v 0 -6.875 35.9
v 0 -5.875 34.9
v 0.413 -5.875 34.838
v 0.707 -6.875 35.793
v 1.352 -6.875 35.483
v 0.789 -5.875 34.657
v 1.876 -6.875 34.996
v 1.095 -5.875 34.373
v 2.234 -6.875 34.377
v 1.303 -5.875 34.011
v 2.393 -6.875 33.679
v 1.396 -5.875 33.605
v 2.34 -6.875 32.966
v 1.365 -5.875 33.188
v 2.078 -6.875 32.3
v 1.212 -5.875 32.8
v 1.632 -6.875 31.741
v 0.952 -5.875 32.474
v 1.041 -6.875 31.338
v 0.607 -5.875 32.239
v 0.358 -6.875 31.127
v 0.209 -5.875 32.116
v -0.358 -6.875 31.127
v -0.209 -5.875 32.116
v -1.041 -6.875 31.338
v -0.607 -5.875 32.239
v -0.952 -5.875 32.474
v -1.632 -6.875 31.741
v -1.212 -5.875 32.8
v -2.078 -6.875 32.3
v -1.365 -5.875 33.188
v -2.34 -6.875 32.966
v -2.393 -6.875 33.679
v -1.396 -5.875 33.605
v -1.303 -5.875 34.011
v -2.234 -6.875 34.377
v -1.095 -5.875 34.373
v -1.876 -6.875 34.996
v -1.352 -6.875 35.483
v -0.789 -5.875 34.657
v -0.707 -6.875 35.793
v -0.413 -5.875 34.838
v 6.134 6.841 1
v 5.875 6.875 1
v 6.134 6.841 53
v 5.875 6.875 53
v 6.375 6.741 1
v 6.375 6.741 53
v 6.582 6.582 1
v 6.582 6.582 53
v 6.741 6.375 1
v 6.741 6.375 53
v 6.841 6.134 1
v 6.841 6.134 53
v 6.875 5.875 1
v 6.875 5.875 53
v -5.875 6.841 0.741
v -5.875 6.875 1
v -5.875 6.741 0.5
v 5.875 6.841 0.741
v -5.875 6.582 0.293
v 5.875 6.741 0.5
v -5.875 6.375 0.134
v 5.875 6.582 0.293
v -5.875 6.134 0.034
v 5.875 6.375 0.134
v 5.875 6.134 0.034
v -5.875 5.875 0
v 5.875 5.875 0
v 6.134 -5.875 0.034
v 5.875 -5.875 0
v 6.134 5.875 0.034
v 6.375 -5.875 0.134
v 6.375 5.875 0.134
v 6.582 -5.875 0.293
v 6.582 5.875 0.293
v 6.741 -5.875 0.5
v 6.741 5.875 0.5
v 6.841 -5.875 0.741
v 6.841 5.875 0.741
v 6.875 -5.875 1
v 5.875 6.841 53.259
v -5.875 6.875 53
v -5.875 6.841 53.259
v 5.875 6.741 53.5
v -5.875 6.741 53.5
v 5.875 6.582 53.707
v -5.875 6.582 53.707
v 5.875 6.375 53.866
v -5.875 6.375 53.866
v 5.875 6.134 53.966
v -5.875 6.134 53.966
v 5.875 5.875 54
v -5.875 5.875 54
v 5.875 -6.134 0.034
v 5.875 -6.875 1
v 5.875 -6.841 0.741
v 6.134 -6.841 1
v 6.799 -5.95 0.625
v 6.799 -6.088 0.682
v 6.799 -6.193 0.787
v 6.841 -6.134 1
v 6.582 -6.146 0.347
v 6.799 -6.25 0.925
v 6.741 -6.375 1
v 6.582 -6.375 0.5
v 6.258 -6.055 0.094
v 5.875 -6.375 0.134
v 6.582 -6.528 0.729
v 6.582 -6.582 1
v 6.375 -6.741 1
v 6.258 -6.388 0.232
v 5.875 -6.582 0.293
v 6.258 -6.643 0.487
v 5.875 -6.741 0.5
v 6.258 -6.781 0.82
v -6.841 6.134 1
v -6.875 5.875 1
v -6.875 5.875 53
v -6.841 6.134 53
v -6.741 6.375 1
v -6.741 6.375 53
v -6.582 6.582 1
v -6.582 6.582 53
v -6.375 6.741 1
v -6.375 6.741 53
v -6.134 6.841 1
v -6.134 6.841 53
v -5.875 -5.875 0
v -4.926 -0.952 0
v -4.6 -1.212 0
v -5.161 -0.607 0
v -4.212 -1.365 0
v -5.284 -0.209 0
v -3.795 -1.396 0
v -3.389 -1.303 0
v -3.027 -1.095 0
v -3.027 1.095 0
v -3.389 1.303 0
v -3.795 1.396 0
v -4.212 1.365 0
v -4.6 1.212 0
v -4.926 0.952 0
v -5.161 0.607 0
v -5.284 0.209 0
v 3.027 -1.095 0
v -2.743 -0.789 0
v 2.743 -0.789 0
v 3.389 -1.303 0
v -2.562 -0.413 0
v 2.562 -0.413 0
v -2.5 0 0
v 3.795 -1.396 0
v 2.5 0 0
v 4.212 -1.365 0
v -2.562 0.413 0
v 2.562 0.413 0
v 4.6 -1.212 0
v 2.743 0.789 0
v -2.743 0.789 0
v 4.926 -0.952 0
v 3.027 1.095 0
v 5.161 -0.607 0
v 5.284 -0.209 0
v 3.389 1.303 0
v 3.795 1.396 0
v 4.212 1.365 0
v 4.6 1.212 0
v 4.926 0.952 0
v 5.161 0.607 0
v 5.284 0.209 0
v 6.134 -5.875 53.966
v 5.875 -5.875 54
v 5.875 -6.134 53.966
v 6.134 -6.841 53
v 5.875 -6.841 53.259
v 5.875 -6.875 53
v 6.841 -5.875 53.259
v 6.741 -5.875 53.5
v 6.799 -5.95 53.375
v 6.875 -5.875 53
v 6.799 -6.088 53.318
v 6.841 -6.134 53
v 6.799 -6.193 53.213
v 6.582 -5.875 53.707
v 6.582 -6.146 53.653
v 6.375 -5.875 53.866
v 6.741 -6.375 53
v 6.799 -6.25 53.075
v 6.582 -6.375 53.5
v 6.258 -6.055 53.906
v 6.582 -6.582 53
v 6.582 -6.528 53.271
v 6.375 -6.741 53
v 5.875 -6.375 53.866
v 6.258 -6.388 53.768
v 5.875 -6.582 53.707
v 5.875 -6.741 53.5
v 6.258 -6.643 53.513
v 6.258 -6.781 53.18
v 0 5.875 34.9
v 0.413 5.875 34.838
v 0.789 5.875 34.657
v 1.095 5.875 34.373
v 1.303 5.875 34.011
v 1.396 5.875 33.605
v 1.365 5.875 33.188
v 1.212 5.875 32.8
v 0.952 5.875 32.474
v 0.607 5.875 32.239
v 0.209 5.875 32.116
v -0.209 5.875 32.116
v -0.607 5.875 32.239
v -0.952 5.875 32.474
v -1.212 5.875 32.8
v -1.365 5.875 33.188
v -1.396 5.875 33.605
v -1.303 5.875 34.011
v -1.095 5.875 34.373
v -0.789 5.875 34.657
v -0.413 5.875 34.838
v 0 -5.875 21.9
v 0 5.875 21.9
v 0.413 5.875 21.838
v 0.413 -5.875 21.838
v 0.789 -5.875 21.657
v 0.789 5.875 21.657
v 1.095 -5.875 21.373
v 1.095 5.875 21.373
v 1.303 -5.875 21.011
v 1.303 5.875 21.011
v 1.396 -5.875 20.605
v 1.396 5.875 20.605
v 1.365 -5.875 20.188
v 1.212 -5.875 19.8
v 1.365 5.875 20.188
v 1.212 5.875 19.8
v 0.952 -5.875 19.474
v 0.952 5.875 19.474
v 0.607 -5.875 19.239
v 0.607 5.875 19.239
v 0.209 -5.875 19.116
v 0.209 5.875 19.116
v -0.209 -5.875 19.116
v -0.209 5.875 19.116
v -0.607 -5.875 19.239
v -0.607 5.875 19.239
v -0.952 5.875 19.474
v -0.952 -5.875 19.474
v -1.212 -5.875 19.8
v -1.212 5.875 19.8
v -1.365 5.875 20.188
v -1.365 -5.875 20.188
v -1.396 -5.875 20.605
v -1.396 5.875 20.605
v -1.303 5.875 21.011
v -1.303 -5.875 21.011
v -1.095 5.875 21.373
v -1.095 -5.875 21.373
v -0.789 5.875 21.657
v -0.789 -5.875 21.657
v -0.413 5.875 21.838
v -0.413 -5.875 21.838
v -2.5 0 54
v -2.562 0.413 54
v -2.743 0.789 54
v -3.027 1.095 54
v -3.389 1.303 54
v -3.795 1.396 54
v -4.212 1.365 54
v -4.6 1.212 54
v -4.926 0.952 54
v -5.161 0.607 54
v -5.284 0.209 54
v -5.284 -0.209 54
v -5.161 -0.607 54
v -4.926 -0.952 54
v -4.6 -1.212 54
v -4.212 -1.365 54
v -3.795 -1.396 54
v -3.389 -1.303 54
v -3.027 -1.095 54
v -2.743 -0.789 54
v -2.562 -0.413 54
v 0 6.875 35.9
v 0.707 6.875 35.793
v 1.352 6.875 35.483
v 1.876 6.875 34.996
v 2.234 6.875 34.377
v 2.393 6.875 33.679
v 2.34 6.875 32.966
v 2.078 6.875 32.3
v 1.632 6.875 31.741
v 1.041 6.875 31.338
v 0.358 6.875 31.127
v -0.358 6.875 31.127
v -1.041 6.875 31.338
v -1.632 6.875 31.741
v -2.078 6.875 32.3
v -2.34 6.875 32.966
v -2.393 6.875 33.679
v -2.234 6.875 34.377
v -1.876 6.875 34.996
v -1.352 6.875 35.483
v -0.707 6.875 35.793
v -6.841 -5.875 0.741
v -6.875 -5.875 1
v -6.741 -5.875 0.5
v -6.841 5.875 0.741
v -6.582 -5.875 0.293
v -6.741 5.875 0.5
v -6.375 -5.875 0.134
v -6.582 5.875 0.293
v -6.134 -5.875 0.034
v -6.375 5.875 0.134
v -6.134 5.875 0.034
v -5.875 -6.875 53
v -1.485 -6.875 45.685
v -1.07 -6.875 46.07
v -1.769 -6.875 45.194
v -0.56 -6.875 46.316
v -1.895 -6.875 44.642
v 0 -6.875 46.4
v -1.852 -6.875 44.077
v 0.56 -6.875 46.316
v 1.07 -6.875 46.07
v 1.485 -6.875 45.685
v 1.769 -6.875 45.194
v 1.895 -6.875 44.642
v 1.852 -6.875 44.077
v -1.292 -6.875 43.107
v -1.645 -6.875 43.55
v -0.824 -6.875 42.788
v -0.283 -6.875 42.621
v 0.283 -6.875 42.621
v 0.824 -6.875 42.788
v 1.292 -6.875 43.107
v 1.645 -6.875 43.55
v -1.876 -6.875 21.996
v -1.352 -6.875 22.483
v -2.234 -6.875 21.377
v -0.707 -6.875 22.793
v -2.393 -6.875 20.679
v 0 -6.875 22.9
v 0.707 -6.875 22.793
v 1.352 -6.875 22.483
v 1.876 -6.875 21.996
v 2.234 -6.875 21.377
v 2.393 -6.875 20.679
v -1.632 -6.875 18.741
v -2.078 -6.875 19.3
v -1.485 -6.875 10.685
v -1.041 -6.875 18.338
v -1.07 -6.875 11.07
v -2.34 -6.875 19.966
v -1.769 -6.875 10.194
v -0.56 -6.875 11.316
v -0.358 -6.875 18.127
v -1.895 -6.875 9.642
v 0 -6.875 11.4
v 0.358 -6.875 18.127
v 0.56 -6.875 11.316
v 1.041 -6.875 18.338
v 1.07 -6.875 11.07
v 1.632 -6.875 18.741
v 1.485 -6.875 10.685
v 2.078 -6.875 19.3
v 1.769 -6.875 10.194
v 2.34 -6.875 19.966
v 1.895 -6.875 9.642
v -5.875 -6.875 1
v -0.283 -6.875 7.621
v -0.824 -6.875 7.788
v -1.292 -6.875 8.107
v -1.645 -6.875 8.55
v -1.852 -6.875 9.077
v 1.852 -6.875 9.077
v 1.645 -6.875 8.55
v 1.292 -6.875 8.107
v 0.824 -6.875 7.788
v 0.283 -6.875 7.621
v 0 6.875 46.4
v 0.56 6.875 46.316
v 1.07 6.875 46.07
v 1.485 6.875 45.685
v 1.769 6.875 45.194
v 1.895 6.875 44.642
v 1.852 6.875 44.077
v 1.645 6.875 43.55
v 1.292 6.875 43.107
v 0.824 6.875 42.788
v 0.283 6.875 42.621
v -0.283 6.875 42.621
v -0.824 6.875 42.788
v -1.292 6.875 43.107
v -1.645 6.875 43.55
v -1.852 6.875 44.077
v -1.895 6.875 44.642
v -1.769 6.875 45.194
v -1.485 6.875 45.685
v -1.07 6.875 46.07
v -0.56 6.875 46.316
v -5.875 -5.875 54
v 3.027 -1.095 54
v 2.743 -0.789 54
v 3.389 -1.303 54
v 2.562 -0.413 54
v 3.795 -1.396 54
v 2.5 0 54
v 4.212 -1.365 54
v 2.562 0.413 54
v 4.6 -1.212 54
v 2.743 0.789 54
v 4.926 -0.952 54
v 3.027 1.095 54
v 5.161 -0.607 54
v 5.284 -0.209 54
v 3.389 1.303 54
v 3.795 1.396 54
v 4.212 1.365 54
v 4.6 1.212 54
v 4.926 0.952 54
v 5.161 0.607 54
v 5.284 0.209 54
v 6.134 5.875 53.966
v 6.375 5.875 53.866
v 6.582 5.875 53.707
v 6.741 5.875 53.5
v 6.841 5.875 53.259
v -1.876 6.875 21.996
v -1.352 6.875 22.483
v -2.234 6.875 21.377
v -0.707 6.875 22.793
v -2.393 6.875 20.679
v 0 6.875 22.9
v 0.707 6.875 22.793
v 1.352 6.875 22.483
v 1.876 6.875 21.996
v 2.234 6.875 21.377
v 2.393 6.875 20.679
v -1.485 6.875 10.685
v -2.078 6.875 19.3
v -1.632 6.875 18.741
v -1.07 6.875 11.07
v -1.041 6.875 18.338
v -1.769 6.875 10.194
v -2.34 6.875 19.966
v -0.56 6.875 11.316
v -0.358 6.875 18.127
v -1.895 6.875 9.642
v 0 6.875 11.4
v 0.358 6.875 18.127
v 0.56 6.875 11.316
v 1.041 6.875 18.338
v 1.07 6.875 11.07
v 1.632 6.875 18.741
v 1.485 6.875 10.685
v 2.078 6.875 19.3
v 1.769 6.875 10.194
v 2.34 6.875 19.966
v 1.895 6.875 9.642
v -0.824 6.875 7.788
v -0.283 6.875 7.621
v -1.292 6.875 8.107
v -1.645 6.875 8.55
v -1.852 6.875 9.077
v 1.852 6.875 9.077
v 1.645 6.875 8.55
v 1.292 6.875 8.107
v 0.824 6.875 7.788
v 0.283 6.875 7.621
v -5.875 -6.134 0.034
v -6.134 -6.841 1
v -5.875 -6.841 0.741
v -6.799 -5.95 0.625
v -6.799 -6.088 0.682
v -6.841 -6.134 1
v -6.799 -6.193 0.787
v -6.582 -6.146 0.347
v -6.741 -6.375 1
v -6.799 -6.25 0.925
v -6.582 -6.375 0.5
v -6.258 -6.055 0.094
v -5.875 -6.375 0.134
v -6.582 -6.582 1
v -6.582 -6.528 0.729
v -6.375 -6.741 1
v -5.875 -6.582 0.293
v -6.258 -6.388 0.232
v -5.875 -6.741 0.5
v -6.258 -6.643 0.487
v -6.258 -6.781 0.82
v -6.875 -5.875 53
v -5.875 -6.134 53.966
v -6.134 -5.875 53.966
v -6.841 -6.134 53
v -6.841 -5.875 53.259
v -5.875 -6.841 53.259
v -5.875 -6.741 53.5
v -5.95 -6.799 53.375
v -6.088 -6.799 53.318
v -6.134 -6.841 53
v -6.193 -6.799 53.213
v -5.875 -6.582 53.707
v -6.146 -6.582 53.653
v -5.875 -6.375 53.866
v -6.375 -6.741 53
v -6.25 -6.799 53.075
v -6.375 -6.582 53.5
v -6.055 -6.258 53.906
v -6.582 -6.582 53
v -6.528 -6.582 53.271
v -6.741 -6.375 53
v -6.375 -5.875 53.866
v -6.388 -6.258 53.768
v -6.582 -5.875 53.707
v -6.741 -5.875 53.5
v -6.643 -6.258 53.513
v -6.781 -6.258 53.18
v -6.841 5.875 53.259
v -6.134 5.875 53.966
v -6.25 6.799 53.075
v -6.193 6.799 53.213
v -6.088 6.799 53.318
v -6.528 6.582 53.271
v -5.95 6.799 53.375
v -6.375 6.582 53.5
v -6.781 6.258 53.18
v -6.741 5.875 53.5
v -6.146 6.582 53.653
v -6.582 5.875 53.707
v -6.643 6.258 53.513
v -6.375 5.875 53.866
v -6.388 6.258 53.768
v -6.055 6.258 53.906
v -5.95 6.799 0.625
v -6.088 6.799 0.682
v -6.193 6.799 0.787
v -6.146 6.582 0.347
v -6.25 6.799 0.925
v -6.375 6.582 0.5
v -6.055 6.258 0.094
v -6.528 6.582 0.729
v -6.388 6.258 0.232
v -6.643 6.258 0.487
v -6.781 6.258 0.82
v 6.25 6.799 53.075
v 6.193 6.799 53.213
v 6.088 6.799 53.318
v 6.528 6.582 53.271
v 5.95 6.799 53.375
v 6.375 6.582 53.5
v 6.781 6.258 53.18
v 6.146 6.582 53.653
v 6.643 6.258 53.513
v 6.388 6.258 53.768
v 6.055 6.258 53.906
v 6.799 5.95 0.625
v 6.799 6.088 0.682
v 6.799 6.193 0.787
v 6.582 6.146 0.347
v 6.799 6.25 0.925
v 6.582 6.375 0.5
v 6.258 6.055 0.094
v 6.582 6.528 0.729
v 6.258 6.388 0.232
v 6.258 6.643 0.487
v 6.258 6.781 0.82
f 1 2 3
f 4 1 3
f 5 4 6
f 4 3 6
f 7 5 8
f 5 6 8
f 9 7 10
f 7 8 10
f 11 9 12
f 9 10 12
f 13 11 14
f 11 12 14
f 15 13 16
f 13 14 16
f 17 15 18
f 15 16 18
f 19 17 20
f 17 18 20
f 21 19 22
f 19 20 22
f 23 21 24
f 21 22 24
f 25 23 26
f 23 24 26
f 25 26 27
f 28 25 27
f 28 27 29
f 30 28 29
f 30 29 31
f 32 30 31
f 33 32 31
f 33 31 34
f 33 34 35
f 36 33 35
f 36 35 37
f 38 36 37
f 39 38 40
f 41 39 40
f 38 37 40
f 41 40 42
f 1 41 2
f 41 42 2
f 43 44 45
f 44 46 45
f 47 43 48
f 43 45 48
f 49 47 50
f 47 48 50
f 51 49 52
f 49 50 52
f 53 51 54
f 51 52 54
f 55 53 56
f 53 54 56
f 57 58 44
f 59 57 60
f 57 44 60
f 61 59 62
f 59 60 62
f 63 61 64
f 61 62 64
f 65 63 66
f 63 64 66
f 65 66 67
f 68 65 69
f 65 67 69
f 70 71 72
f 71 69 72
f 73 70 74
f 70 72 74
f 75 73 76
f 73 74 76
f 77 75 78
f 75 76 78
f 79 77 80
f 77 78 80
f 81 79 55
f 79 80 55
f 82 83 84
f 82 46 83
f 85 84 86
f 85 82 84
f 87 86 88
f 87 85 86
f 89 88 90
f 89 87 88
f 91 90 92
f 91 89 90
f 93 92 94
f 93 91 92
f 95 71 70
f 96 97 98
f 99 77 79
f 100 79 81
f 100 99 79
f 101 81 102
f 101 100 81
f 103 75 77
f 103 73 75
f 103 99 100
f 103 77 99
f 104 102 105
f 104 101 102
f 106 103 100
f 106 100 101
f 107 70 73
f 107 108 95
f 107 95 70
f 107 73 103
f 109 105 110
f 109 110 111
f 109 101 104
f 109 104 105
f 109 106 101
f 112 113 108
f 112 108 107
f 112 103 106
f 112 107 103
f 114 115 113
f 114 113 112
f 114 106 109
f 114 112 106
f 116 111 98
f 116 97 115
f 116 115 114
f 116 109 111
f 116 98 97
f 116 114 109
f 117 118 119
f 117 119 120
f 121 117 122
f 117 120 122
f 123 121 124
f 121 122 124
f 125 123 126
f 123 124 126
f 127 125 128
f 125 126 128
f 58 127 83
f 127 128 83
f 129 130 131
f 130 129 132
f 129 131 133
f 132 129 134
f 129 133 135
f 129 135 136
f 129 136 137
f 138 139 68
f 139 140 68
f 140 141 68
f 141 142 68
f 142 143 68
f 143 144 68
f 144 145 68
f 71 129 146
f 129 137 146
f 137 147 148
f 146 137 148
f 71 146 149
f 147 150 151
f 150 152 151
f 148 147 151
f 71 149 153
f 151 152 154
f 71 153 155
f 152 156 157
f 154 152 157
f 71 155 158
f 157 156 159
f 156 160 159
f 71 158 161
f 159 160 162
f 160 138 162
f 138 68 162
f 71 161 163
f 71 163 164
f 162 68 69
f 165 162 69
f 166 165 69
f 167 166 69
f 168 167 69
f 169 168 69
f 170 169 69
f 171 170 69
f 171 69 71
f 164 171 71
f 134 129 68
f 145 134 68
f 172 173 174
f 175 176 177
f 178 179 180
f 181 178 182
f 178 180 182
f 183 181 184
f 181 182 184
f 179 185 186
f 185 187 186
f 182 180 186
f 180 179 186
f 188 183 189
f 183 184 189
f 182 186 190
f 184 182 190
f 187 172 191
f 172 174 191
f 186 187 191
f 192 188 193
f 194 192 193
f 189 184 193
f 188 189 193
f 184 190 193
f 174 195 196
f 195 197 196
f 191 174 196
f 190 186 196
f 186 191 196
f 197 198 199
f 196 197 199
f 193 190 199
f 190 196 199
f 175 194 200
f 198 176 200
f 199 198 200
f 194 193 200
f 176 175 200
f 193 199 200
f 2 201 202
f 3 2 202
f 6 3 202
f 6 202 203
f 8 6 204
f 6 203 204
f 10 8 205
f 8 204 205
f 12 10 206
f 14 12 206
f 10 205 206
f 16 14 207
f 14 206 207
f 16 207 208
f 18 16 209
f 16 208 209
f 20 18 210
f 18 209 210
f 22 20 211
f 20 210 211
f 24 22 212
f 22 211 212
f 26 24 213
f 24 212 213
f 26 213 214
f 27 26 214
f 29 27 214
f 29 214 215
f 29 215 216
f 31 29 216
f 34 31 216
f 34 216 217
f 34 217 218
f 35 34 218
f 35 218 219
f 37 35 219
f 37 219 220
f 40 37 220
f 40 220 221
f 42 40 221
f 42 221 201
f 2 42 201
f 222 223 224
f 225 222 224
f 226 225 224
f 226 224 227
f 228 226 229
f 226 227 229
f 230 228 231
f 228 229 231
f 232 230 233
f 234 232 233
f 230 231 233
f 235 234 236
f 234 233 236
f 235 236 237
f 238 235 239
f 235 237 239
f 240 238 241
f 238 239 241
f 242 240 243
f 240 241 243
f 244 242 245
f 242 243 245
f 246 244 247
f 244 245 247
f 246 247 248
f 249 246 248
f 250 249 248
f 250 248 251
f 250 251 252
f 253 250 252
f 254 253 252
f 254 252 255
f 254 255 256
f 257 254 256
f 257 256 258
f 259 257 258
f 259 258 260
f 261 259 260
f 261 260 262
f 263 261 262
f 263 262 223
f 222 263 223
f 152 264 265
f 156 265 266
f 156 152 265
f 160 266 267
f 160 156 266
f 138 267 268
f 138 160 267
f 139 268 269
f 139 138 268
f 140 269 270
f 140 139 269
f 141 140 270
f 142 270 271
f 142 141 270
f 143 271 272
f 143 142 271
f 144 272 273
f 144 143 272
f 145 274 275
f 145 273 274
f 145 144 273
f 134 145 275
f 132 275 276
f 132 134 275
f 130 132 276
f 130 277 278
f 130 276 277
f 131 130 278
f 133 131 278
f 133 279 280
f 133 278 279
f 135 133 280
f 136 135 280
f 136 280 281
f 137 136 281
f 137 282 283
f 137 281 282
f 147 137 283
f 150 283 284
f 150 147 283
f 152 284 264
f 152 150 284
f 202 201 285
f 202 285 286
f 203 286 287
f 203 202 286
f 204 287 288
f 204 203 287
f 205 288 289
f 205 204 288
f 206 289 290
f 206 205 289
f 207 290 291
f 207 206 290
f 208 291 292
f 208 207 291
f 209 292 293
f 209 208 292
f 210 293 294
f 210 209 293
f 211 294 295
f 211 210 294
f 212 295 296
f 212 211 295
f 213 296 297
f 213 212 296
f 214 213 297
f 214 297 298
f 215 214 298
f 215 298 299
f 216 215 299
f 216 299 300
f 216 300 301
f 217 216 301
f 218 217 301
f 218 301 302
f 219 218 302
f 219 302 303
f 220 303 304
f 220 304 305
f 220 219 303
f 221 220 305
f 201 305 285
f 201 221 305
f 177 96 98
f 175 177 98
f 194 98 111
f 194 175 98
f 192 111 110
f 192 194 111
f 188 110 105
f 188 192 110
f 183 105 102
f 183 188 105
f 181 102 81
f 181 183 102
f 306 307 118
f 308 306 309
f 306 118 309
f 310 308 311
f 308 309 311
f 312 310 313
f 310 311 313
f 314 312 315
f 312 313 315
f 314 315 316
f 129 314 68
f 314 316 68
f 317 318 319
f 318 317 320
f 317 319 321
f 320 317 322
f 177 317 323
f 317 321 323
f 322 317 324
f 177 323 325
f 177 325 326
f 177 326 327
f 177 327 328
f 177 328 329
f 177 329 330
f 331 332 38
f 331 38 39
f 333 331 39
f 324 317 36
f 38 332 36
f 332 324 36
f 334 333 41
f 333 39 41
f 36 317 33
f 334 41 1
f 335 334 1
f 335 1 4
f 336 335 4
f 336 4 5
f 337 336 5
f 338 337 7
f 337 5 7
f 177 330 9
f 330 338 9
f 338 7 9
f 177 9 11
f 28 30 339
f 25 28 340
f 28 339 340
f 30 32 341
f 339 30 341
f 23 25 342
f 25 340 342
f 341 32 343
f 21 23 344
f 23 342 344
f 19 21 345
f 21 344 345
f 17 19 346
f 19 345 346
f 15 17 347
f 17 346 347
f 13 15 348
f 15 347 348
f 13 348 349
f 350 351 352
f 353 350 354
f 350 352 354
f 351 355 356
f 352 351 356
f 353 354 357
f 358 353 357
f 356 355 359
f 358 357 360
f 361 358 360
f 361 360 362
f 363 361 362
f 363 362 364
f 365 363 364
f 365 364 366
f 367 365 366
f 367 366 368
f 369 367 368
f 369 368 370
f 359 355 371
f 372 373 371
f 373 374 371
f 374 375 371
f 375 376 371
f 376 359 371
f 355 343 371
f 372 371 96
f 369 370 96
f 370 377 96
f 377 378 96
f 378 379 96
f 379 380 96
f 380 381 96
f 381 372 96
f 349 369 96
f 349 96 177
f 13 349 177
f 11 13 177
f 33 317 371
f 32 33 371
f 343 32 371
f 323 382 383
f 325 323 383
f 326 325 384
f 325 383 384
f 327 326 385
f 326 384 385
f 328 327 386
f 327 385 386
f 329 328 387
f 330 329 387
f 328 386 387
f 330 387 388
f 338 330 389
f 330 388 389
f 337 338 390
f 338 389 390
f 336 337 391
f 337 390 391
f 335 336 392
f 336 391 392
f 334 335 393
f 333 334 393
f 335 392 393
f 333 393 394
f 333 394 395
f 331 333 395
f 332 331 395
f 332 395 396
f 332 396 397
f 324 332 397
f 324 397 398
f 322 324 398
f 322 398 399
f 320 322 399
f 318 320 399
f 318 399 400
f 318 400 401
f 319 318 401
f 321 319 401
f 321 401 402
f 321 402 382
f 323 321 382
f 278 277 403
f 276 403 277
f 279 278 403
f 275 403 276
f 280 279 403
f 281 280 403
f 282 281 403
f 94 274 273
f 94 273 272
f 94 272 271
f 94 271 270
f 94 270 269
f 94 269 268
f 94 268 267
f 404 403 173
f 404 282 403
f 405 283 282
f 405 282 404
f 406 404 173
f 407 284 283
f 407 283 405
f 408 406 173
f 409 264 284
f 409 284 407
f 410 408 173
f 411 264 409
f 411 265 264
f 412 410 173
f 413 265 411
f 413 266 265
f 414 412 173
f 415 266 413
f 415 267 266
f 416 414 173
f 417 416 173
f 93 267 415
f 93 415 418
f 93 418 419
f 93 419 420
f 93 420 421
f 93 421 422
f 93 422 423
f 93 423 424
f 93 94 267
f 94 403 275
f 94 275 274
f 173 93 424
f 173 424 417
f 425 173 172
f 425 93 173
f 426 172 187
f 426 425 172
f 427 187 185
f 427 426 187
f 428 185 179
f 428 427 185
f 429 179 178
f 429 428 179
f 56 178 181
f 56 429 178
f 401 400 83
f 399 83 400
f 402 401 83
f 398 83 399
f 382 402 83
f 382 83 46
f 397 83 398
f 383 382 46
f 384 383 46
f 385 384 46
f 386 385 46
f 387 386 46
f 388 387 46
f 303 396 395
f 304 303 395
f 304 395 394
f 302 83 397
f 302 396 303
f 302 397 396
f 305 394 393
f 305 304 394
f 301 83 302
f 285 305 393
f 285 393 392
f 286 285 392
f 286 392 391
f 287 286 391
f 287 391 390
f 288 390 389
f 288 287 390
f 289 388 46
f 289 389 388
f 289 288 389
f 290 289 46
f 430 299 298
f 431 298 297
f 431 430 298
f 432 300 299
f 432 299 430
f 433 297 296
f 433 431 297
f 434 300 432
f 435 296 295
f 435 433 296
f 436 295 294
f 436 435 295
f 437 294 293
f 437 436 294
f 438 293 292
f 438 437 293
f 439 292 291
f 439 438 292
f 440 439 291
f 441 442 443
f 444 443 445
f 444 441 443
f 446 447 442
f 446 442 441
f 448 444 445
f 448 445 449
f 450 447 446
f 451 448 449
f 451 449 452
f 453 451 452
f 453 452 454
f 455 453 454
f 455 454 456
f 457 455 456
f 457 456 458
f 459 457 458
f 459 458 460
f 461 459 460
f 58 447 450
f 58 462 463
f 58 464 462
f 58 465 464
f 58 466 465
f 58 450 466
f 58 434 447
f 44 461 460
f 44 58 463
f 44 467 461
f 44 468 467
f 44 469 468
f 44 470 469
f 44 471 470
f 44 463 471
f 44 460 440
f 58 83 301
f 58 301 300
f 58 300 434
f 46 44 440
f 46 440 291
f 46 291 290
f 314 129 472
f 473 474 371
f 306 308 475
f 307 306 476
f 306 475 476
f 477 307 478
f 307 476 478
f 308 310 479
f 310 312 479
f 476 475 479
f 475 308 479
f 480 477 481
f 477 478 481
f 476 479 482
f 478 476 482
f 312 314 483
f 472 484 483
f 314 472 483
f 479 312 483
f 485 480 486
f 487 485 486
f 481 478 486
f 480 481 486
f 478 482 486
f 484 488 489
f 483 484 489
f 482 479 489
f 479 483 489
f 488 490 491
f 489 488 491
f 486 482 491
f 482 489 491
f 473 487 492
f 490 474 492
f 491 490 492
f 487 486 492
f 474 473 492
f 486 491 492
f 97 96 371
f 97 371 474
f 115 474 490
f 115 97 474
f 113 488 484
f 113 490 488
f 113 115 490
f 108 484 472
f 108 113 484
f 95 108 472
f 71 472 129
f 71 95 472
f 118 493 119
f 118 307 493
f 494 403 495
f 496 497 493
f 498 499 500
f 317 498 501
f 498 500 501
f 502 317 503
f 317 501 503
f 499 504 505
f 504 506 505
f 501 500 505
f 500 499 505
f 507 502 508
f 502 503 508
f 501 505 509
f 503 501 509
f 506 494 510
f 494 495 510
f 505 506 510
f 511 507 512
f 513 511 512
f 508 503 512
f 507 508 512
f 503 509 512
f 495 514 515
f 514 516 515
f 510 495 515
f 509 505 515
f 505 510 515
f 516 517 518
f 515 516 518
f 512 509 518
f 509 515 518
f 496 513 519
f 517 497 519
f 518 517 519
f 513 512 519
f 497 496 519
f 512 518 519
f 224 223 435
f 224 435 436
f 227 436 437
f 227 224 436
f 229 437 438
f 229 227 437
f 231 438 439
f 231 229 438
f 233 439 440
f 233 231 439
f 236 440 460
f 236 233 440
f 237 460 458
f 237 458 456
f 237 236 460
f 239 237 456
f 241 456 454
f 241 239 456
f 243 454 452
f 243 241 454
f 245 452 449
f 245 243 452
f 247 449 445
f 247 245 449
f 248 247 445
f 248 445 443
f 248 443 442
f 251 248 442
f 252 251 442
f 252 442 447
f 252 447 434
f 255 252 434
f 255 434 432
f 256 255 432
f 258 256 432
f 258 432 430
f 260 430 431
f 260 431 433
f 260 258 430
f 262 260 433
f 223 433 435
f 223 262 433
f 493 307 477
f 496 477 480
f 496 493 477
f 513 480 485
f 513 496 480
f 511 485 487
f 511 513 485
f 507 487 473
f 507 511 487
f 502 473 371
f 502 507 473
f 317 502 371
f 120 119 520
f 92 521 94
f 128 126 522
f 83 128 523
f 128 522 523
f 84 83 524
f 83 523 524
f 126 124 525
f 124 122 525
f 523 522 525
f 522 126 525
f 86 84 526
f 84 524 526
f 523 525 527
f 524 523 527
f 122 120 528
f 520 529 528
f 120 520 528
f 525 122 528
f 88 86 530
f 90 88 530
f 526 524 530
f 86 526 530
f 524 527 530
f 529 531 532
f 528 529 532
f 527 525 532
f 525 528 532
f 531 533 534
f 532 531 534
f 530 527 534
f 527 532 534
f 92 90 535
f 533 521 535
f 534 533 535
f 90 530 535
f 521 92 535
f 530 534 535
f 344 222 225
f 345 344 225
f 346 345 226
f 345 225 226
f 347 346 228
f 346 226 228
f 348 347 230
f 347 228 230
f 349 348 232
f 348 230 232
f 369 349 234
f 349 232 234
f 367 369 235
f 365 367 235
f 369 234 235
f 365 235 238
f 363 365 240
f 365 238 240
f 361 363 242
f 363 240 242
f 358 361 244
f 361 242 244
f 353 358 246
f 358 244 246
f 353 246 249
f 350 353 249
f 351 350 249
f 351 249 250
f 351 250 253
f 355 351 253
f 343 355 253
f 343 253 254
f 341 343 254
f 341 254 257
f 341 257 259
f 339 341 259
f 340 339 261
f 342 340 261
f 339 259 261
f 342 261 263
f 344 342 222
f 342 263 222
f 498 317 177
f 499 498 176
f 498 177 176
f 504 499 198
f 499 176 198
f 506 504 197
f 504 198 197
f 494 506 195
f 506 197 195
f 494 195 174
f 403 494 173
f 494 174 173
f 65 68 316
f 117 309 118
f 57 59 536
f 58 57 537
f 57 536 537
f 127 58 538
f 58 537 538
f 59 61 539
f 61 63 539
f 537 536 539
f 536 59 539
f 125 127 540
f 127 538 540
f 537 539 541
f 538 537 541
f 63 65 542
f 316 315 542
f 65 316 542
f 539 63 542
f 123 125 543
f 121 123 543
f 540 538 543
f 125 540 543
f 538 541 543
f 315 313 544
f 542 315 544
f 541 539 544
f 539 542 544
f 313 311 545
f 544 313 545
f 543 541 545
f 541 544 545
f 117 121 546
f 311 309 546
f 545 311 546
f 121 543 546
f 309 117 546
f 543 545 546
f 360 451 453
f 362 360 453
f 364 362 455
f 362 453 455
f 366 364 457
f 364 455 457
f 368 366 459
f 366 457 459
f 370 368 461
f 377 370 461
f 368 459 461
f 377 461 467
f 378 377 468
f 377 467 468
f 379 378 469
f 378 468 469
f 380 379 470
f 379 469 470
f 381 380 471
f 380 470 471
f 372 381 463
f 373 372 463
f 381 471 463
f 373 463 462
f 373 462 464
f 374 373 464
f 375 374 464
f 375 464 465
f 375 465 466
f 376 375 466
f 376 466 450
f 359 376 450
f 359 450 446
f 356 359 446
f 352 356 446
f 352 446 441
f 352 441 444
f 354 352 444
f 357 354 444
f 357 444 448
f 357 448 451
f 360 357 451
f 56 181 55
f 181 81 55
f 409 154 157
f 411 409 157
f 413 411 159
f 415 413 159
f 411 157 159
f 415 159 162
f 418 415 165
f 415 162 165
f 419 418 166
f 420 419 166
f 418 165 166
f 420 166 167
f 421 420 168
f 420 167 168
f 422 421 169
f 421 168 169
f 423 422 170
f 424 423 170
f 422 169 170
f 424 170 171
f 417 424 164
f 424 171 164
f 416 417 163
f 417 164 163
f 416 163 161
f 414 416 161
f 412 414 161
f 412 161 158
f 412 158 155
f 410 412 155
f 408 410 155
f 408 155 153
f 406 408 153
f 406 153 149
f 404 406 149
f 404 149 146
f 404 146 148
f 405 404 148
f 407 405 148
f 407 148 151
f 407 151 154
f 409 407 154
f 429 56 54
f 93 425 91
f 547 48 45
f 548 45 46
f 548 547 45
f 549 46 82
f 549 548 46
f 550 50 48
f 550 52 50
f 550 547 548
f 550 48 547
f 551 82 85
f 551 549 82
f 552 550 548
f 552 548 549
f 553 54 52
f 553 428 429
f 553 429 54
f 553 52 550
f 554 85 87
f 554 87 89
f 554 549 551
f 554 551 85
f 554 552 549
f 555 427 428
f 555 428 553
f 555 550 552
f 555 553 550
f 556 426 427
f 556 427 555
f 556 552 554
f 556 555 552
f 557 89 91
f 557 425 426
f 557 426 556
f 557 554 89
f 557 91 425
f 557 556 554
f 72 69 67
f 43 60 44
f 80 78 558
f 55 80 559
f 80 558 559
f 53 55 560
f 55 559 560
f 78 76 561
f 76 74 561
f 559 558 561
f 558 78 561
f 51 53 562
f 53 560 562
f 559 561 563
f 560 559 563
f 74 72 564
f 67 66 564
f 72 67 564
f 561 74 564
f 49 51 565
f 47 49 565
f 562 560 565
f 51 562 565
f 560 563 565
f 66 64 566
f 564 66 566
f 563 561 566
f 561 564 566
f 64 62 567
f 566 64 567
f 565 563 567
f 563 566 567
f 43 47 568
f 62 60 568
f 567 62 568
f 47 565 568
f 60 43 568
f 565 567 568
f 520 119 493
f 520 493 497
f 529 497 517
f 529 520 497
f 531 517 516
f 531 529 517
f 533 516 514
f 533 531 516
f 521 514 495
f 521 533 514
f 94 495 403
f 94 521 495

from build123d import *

# Parameters (mm, degrees)
SKETCH1_W           = 13.75
SKETCH1_H           = 13.75
BOSS_EXTRUDE1_DEPTH = 54
SKETCH3_R           = 1.9
SKETCH3_R_2         = 1.4
CUT_EXTRUDE2_DEPTH  = 57.145597557
SKETCH9_R           = 1.4
CUT_EXTRUDE7_DEPTH  = 55.868308248
FILLET2_R           = 1
CHAMFER1_SIZE       = 1


with BuildPart() as part:
    # Sketch1 → Boss-Extrude1 (new body)
    with BuildSketch(Plane.XY):
        Rectangle(SKETCH1_W, SKETCH1_H)
    extrude(amount=BOSS_EXTRUDE1_DEPTH)

    # Sketch3 → Cut-Extrude2 (cut, through all)
    with BuildSketch(Plane(origin=(0, 6.875, 0), x_dir=(1, 0, 0), z_dir=(0, 1, 0))):
        with Locations((0, -9.5)):
            Circle(SKETCH3_R)
        with Locations((0, -44.5)):
            Circle(SKETCH3_R)
        with Locations((0, -20.5)):
            Circle(SKETCH3_R_2)
        with Locations((0, -33.5)):
            Circle(SKETCH3_R_2)
    extrude(amount=-CUT_EXTRUDE2_DEPTH, mode=Mode.SUBTRACT)

    # Sketch9 → Cut-Extrude7 (cut, through all)
    with BuildSketch(Plane(origin=(0, 0, 0), x_dir=(-1, 0, 0), z_dir=(0, 0, -1))):
        with Locations((-3.9, 0)):
            Circle(SKETCH9_R)
    cut_extrude7 = extrude(amount=-CUT_EXTRUDE7_DEPTH, mode=Mode.SUBTRACT)

    # Mirror5: Cut-Extrude7 across plane
    add(cut_extrude7.mirror(Plane(origin=(0, 0, 0), x_dir=(0, 0, 1), z_dir=(1, 0, 0))), mode=Mode.SUBTRACT)

    # Fillet2
    fillet2_edges = [part.edges().sort_by_distance(p)[0] for p in [
        (0, 6.875, 0),
        (-6.875, 0, 0),
        (0, -6.875, 0),
        (6.875, 0, 0),
        (6.875, 0, 54),
        (-6.875, 0, 54),
        (0, 6.875, 54),
        (6.875, -6.875, 27),
        (-6.875, -6.875, 27),
        (6.875, 6.875, 27),
        (-6.875, 6.875, 27),
        (0, -6.875, 54),
    ]]
    fillet(fillet2_edges, radius=FILLET2_R)

    # Chamfer1
    chamfer1_edges = [part.edges().sort_by_distance(p)[0] for p in [
        (-1.4, -6.875, 20.5),
        (-1.4, -6.875, 33.5),
        (-1.4, 6.875, 33.5),
        (-1.4, 6.875, 20.5),
    ]]
    chamfer(chamfer1_edges, length=CHAMFER1_SIZE)


solid = part.part
